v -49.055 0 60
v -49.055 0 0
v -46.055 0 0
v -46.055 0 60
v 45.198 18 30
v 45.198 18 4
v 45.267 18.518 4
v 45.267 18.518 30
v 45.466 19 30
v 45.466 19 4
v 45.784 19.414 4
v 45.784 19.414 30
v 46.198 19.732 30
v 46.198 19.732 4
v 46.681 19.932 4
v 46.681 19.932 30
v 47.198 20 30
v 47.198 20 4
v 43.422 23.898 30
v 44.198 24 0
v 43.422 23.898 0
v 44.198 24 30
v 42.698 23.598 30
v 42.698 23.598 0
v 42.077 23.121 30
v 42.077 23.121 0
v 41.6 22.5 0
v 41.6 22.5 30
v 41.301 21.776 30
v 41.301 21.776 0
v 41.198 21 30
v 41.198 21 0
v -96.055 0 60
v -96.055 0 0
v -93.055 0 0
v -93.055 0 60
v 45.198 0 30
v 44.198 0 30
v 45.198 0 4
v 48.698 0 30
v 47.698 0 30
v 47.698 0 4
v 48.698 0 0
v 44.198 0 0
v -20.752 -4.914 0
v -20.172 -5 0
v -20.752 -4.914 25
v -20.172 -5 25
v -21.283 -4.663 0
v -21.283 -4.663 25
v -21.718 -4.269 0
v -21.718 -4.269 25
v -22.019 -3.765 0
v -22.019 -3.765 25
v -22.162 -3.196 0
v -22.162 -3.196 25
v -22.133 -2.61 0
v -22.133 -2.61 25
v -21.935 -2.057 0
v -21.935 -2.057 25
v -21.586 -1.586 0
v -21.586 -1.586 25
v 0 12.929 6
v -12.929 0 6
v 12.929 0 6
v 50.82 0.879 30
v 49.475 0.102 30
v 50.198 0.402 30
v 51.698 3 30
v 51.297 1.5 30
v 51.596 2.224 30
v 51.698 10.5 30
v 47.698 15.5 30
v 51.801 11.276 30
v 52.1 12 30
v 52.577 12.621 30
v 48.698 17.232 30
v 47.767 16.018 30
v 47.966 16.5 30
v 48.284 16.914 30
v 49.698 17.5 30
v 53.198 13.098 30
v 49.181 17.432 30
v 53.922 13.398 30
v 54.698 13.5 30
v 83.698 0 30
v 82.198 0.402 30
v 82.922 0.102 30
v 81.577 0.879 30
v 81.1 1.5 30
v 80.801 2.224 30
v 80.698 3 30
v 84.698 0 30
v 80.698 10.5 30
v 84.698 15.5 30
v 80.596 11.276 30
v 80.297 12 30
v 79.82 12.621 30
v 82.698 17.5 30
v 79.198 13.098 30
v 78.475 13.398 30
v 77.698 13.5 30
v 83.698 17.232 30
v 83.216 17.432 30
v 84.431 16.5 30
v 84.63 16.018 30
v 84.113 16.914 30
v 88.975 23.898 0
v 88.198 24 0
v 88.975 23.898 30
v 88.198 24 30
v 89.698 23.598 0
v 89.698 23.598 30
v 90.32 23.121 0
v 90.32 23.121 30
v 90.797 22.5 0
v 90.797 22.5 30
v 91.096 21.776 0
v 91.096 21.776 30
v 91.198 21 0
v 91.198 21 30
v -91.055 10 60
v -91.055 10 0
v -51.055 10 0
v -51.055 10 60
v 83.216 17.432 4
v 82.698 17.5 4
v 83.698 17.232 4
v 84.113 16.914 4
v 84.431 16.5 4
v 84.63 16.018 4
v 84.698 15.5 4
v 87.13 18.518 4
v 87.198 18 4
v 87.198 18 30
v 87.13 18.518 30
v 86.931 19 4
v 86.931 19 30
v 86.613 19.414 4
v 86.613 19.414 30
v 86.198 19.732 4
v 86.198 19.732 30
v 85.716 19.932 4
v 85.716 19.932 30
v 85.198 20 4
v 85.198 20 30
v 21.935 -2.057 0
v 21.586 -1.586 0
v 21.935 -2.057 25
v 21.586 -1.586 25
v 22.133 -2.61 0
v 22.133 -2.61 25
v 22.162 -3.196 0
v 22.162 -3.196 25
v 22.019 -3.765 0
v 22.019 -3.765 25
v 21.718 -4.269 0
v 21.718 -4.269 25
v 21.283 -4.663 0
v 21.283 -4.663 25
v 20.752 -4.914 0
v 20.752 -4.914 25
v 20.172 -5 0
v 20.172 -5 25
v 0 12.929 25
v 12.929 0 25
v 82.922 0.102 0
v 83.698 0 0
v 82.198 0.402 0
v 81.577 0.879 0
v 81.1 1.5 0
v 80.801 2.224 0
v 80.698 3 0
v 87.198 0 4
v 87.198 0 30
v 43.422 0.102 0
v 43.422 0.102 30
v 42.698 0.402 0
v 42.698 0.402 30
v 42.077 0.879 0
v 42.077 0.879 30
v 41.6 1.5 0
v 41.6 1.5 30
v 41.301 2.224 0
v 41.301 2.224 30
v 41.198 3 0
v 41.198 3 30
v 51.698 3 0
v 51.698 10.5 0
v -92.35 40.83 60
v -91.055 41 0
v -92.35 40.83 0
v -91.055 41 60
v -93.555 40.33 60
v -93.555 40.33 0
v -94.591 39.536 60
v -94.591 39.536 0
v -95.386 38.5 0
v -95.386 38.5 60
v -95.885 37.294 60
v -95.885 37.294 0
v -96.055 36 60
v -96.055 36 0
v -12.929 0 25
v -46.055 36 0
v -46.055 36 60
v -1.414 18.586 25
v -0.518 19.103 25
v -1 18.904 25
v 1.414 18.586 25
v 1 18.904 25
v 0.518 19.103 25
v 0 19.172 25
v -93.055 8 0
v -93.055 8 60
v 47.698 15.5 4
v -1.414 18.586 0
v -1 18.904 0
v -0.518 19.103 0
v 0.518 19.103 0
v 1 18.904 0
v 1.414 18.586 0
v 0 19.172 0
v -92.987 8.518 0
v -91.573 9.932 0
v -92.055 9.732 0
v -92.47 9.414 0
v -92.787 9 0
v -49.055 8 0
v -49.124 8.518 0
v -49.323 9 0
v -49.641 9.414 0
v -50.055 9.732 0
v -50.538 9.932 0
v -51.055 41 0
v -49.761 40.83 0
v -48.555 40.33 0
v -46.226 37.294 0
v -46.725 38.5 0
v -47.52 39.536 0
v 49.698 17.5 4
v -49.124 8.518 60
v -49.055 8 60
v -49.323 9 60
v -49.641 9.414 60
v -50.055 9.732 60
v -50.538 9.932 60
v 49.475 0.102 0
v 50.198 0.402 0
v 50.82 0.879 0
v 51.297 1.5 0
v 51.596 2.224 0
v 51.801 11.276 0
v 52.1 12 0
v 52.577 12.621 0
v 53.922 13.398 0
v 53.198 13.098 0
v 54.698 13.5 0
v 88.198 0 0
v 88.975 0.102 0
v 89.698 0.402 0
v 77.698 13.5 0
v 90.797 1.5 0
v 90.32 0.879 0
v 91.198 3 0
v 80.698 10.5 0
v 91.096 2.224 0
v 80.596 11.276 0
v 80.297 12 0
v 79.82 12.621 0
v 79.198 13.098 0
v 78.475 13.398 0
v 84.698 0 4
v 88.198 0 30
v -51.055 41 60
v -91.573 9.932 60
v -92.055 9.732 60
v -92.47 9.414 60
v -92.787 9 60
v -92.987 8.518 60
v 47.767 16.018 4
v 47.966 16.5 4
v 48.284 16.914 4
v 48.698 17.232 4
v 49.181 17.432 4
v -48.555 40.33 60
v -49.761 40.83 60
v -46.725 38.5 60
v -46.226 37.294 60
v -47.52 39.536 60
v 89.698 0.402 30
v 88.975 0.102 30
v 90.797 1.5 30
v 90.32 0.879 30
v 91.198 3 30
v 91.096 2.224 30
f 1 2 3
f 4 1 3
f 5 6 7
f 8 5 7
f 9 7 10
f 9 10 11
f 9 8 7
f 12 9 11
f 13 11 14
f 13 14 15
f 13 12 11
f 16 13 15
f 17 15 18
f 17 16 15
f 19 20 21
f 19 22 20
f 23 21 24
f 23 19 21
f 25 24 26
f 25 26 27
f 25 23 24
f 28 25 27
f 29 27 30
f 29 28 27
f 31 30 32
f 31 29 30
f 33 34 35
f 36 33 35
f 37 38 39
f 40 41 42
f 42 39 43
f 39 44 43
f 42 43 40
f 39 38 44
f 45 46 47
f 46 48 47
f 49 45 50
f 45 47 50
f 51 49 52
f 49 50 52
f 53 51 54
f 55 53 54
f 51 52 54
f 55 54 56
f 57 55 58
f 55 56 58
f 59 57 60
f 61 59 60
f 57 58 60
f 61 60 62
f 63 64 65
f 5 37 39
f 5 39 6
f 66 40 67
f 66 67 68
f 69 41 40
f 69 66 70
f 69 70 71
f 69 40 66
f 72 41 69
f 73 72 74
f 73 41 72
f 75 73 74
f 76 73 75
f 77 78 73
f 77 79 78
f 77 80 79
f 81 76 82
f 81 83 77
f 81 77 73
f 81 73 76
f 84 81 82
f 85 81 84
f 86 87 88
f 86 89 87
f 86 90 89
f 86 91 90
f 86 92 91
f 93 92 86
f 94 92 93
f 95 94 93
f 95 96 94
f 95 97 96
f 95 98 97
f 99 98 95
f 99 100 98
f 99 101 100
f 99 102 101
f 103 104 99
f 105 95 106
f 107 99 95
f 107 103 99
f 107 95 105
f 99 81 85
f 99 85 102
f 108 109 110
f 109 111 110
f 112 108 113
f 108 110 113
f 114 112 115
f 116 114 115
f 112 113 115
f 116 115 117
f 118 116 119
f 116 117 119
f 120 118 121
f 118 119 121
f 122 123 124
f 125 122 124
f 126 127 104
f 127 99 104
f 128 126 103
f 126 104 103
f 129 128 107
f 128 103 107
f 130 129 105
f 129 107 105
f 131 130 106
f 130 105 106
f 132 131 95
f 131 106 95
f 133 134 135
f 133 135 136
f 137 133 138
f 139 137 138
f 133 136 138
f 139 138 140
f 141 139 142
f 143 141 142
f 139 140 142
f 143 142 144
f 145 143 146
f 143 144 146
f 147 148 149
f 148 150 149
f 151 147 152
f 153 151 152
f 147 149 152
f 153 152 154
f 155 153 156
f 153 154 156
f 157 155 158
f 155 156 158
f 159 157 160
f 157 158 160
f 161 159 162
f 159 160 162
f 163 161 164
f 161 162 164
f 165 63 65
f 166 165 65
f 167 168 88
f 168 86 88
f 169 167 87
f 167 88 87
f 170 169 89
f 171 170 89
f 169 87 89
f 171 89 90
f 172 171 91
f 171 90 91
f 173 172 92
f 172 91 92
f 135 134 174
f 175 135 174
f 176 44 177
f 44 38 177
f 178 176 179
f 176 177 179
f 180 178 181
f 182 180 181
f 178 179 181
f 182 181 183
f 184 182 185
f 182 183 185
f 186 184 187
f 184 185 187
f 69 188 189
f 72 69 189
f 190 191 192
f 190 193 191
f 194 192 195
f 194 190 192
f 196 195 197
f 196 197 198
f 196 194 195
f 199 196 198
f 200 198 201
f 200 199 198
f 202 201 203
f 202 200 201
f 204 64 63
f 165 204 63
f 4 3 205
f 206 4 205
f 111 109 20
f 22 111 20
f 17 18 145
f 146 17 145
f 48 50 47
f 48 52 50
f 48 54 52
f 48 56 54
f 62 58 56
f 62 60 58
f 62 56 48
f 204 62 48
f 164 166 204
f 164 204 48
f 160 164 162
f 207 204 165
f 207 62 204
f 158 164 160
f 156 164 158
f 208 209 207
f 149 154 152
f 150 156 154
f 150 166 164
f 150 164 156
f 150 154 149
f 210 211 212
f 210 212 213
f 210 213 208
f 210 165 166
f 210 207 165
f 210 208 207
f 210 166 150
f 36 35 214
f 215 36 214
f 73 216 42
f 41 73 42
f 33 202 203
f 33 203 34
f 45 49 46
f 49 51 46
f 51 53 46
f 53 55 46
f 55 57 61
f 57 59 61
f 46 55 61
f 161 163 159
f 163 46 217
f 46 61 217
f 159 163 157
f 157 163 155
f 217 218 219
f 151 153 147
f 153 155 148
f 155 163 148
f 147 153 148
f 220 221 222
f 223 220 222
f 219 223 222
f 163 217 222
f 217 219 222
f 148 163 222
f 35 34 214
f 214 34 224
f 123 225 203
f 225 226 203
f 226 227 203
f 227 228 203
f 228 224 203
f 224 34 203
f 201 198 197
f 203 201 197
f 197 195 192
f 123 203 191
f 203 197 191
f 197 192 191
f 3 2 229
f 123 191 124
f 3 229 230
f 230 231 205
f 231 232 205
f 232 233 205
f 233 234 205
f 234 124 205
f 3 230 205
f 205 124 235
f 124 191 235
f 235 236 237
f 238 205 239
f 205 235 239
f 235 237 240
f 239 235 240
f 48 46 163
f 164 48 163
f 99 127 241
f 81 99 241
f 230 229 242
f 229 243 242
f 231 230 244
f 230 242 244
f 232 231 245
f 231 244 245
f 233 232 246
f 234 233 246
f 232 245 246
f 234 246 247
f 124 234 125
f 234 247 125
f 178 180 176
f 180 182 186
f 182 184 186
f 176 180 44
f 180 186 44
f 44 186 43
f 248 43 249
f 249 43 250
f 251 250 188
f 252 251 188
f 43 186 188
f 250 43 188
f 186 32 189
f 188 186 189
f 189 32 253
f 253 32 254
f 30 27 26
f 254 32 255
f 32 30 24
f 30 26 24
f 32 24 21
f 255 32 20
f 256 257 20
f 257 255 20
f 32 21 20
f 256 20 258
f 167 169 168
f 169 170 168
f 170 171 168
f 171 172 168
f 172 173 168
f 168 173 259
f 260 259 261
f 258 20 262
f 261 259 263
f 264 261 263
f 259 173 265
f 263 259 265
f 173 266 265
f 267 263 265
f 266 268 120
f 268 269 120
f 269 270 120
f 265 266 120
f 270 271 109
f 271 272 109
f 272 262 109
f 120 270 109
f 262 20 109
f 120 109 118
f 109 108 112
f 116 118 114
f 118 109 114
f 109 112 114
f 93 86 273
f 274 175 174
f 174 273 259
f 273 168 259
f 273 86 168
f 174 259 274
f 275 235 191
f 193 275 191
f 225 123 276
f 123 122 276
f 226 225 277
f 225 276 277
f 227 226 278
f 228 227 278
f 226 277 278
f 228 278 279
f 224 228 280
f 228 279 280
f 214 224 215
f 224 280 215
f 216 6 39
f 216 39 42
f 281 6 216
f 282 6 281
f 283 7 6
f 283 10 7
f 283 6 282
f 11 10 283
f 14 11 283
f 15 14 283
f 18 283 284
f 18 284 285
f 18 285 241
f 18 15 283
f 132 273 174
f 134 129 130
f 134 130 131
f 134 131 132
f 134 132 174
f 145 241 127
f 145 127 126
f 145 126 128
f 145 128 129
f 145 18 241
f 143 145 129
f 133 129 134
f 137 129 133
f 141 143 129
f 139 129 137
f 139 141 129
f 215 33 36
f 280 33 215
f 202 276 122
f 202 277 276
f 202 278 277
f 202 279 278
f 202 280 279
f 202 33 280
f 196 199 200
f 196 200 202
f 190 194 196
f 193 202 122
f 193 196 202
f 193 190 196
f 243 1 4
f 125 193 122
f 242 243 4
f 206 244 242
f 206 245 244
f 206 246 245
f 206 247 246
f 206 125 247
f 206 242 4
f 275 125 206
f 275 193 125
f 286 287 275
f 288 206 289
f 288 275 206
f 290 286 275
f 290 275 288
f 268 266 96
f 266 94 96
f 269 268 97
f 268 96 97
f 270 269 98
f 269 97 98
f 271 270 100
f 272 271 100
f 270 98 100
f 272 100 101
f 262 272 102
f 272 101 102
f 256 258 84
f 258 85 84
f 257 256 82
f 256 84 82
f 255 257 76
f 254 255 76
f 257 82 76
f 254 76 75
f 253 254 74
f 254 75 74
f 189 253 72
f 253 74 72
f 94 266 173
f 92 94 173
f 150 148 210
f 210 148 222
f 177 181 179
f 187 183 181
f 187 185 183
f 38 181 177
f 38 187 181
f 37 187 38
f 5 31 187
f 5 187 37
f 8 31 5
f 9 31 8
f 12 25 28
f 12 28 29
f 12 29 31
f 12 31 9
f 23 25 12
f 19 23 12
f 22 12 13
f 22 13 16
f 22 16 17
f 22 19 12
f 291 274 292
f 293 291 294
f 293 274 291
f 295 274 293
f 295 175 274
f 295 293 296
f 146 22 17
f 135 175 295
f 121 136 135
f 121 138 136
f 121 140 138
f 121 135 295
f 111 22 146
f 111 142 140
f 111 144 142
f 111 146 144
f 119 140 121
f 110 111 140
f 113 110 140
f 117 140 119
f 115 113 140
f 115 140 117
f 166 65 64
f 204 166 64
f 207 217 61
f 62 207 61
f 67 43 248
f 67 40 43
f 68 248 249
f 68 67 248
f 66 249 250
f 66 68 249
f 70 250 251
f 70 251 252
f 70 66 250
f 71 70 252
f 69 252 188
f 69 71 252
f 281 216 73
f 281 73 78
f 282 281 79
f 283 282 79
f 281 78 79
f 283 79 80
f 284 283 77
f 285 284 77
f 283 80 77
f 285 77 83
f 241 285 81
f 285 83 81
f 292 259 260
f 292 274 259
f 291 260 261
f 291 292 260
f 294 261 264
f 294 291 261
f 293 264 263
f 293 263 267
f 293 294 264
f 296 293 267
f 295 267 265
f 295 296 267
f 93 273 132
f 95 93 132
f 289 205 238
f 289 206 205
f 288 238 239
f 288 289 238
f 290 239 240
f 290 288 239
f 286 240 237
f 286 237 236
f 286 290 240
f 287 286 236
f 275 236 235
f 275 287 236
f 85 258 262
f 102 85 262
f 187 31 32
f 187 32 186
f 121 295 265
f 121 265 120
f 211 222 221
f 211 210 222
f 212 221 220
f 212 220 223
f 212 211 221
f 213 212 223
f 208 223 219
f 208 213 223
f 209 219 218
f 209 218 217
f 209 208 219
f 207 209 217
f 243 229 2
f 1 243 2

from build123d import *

# Parameters (mm, degrees)
F1_DEPTH  = 6
F2_DEPTH  = 25
F3_R      = 2
F5_DEPTH  = 60
F6_R      = 5
F7_R      = 2
F9_DEPTH  = 4
F10_DEPTH = 30
F11_R     = 3
F12_R     = 2


with BuildPart() as f1:
    # F0 (on Top) → F1 (new body)
    with BuildSketch(Plane.XY):
        Polygon((12.928932, 0), (0, 12.928932), (-12.928932, 0), align=None)
    extrude(amount=F1_DEPTH)

    # F0 (on Top) → F2 (join)
    with BuildSketch(Plane.XY):
        Polygon((25, -5), (0, 20), (-25, -5), align=None)
        Polygon((-12.928932, 0), (0, 12.928932), (12.928932, 0), align=None, mode=Mode.SUBTRACT)
    extrude(amount=F2_DEPTH)

    # F3
    f3_edges = [f1.edges().sort_by_distance(p)[0] for p in [
        (-25, -5, 12.5),
        (25, -5, 12.5),
        (0, 20, 12.5),
    ]]
    fillet(f3_edges, radius=F3_R)


with BuildPart() as f5:
    # F4 (on Top) → F5 (new body)
    with BuildSketch(Plane.XY):
        Polygon((-49.055441, 0), (-46.055441, 0), (-46.055441, 41), (-96.055441, 41), (-96.055441, 0), (-93.055441, 0), (-93.055441, 10), (-49.055441, 10), align=None)
    extrude(amount=F5_DEPTH)

    # F6
    f6_edges = [f5.edges().sort_by_distance(p)[0] for p in [
        (-96.055441, 41, 30),
        (-46.055441, 41, 30),
    ]]
    fillet(f6_edges, radius=F6_R)

    # F7
    f7_edges = [f5.edges().sort_by_distance(p)[0] for p in [
        (-93.055441, 10, 30),
        (-49.055441, 10, 30),
    ]]
    fillet(f7_edges, radius=F7_R)


with BuildPart() as f9:
    # F8 (on Top) → F9 (new body)
    with BuildSketch(Plane.XY):
        Polygon((87.19847, 20), (45.19847, 20), (45.19847, 0), (47.69847, 0), (47.69847, 17.5), (84.69847, 17.5), (84.69847, 0), (87.19847, 0), align=None)
    extrude(amount=F9_DEPTH)

    # F8 (on Top) → F10 (join)
    with BuildSketch(Plane.XY):
        Polygon((45.19847, 0), (45.19847, 20), (87.19847, 20), (87.19847, 0), (91.19847, 0), (91.19847, 24), (41.19847, 24), (41.19847, 0), align=None)
        Polygon((47.69847, 17.5), (47.69847, 0), (51.69847, 0), (51.69847, 13.5), (80.69847, 13.5), (80.69847, 0), (84.69847, 0), (84.69847, 17.5), align=None)
    extrude(amount=F10_DEPTH)

    # F11
    f11_edges = [f9.edges().sort_by_distance(p)[0] for p in [
        (91.19847, 24, 15),
        (41.19847, 24, 15),
        (51.69847, 13.5, 15),
        (80.69847, 13.5, 15),
        (41.19847, 0, 15),
        (51.69847, 0, 15),
        (80.69847, 0, 15),
        (91.19847, 0, 15),
    ]]
    fillet(f11_edges, radius=F11_R)

    # F12
    f12_edges = [f9.edges().sort_by_distance(p)[0] for p in [
        (45.19847, 20, 17),
        (47.69847, 17.5, 17),
        (87.19847, 20, 17),
        (84.69847, 17.5, 17),
    ]]
    fillet(f12_edges, radius=F12_R)


solid = Compound([f1.part, f5.part, f9.part])
